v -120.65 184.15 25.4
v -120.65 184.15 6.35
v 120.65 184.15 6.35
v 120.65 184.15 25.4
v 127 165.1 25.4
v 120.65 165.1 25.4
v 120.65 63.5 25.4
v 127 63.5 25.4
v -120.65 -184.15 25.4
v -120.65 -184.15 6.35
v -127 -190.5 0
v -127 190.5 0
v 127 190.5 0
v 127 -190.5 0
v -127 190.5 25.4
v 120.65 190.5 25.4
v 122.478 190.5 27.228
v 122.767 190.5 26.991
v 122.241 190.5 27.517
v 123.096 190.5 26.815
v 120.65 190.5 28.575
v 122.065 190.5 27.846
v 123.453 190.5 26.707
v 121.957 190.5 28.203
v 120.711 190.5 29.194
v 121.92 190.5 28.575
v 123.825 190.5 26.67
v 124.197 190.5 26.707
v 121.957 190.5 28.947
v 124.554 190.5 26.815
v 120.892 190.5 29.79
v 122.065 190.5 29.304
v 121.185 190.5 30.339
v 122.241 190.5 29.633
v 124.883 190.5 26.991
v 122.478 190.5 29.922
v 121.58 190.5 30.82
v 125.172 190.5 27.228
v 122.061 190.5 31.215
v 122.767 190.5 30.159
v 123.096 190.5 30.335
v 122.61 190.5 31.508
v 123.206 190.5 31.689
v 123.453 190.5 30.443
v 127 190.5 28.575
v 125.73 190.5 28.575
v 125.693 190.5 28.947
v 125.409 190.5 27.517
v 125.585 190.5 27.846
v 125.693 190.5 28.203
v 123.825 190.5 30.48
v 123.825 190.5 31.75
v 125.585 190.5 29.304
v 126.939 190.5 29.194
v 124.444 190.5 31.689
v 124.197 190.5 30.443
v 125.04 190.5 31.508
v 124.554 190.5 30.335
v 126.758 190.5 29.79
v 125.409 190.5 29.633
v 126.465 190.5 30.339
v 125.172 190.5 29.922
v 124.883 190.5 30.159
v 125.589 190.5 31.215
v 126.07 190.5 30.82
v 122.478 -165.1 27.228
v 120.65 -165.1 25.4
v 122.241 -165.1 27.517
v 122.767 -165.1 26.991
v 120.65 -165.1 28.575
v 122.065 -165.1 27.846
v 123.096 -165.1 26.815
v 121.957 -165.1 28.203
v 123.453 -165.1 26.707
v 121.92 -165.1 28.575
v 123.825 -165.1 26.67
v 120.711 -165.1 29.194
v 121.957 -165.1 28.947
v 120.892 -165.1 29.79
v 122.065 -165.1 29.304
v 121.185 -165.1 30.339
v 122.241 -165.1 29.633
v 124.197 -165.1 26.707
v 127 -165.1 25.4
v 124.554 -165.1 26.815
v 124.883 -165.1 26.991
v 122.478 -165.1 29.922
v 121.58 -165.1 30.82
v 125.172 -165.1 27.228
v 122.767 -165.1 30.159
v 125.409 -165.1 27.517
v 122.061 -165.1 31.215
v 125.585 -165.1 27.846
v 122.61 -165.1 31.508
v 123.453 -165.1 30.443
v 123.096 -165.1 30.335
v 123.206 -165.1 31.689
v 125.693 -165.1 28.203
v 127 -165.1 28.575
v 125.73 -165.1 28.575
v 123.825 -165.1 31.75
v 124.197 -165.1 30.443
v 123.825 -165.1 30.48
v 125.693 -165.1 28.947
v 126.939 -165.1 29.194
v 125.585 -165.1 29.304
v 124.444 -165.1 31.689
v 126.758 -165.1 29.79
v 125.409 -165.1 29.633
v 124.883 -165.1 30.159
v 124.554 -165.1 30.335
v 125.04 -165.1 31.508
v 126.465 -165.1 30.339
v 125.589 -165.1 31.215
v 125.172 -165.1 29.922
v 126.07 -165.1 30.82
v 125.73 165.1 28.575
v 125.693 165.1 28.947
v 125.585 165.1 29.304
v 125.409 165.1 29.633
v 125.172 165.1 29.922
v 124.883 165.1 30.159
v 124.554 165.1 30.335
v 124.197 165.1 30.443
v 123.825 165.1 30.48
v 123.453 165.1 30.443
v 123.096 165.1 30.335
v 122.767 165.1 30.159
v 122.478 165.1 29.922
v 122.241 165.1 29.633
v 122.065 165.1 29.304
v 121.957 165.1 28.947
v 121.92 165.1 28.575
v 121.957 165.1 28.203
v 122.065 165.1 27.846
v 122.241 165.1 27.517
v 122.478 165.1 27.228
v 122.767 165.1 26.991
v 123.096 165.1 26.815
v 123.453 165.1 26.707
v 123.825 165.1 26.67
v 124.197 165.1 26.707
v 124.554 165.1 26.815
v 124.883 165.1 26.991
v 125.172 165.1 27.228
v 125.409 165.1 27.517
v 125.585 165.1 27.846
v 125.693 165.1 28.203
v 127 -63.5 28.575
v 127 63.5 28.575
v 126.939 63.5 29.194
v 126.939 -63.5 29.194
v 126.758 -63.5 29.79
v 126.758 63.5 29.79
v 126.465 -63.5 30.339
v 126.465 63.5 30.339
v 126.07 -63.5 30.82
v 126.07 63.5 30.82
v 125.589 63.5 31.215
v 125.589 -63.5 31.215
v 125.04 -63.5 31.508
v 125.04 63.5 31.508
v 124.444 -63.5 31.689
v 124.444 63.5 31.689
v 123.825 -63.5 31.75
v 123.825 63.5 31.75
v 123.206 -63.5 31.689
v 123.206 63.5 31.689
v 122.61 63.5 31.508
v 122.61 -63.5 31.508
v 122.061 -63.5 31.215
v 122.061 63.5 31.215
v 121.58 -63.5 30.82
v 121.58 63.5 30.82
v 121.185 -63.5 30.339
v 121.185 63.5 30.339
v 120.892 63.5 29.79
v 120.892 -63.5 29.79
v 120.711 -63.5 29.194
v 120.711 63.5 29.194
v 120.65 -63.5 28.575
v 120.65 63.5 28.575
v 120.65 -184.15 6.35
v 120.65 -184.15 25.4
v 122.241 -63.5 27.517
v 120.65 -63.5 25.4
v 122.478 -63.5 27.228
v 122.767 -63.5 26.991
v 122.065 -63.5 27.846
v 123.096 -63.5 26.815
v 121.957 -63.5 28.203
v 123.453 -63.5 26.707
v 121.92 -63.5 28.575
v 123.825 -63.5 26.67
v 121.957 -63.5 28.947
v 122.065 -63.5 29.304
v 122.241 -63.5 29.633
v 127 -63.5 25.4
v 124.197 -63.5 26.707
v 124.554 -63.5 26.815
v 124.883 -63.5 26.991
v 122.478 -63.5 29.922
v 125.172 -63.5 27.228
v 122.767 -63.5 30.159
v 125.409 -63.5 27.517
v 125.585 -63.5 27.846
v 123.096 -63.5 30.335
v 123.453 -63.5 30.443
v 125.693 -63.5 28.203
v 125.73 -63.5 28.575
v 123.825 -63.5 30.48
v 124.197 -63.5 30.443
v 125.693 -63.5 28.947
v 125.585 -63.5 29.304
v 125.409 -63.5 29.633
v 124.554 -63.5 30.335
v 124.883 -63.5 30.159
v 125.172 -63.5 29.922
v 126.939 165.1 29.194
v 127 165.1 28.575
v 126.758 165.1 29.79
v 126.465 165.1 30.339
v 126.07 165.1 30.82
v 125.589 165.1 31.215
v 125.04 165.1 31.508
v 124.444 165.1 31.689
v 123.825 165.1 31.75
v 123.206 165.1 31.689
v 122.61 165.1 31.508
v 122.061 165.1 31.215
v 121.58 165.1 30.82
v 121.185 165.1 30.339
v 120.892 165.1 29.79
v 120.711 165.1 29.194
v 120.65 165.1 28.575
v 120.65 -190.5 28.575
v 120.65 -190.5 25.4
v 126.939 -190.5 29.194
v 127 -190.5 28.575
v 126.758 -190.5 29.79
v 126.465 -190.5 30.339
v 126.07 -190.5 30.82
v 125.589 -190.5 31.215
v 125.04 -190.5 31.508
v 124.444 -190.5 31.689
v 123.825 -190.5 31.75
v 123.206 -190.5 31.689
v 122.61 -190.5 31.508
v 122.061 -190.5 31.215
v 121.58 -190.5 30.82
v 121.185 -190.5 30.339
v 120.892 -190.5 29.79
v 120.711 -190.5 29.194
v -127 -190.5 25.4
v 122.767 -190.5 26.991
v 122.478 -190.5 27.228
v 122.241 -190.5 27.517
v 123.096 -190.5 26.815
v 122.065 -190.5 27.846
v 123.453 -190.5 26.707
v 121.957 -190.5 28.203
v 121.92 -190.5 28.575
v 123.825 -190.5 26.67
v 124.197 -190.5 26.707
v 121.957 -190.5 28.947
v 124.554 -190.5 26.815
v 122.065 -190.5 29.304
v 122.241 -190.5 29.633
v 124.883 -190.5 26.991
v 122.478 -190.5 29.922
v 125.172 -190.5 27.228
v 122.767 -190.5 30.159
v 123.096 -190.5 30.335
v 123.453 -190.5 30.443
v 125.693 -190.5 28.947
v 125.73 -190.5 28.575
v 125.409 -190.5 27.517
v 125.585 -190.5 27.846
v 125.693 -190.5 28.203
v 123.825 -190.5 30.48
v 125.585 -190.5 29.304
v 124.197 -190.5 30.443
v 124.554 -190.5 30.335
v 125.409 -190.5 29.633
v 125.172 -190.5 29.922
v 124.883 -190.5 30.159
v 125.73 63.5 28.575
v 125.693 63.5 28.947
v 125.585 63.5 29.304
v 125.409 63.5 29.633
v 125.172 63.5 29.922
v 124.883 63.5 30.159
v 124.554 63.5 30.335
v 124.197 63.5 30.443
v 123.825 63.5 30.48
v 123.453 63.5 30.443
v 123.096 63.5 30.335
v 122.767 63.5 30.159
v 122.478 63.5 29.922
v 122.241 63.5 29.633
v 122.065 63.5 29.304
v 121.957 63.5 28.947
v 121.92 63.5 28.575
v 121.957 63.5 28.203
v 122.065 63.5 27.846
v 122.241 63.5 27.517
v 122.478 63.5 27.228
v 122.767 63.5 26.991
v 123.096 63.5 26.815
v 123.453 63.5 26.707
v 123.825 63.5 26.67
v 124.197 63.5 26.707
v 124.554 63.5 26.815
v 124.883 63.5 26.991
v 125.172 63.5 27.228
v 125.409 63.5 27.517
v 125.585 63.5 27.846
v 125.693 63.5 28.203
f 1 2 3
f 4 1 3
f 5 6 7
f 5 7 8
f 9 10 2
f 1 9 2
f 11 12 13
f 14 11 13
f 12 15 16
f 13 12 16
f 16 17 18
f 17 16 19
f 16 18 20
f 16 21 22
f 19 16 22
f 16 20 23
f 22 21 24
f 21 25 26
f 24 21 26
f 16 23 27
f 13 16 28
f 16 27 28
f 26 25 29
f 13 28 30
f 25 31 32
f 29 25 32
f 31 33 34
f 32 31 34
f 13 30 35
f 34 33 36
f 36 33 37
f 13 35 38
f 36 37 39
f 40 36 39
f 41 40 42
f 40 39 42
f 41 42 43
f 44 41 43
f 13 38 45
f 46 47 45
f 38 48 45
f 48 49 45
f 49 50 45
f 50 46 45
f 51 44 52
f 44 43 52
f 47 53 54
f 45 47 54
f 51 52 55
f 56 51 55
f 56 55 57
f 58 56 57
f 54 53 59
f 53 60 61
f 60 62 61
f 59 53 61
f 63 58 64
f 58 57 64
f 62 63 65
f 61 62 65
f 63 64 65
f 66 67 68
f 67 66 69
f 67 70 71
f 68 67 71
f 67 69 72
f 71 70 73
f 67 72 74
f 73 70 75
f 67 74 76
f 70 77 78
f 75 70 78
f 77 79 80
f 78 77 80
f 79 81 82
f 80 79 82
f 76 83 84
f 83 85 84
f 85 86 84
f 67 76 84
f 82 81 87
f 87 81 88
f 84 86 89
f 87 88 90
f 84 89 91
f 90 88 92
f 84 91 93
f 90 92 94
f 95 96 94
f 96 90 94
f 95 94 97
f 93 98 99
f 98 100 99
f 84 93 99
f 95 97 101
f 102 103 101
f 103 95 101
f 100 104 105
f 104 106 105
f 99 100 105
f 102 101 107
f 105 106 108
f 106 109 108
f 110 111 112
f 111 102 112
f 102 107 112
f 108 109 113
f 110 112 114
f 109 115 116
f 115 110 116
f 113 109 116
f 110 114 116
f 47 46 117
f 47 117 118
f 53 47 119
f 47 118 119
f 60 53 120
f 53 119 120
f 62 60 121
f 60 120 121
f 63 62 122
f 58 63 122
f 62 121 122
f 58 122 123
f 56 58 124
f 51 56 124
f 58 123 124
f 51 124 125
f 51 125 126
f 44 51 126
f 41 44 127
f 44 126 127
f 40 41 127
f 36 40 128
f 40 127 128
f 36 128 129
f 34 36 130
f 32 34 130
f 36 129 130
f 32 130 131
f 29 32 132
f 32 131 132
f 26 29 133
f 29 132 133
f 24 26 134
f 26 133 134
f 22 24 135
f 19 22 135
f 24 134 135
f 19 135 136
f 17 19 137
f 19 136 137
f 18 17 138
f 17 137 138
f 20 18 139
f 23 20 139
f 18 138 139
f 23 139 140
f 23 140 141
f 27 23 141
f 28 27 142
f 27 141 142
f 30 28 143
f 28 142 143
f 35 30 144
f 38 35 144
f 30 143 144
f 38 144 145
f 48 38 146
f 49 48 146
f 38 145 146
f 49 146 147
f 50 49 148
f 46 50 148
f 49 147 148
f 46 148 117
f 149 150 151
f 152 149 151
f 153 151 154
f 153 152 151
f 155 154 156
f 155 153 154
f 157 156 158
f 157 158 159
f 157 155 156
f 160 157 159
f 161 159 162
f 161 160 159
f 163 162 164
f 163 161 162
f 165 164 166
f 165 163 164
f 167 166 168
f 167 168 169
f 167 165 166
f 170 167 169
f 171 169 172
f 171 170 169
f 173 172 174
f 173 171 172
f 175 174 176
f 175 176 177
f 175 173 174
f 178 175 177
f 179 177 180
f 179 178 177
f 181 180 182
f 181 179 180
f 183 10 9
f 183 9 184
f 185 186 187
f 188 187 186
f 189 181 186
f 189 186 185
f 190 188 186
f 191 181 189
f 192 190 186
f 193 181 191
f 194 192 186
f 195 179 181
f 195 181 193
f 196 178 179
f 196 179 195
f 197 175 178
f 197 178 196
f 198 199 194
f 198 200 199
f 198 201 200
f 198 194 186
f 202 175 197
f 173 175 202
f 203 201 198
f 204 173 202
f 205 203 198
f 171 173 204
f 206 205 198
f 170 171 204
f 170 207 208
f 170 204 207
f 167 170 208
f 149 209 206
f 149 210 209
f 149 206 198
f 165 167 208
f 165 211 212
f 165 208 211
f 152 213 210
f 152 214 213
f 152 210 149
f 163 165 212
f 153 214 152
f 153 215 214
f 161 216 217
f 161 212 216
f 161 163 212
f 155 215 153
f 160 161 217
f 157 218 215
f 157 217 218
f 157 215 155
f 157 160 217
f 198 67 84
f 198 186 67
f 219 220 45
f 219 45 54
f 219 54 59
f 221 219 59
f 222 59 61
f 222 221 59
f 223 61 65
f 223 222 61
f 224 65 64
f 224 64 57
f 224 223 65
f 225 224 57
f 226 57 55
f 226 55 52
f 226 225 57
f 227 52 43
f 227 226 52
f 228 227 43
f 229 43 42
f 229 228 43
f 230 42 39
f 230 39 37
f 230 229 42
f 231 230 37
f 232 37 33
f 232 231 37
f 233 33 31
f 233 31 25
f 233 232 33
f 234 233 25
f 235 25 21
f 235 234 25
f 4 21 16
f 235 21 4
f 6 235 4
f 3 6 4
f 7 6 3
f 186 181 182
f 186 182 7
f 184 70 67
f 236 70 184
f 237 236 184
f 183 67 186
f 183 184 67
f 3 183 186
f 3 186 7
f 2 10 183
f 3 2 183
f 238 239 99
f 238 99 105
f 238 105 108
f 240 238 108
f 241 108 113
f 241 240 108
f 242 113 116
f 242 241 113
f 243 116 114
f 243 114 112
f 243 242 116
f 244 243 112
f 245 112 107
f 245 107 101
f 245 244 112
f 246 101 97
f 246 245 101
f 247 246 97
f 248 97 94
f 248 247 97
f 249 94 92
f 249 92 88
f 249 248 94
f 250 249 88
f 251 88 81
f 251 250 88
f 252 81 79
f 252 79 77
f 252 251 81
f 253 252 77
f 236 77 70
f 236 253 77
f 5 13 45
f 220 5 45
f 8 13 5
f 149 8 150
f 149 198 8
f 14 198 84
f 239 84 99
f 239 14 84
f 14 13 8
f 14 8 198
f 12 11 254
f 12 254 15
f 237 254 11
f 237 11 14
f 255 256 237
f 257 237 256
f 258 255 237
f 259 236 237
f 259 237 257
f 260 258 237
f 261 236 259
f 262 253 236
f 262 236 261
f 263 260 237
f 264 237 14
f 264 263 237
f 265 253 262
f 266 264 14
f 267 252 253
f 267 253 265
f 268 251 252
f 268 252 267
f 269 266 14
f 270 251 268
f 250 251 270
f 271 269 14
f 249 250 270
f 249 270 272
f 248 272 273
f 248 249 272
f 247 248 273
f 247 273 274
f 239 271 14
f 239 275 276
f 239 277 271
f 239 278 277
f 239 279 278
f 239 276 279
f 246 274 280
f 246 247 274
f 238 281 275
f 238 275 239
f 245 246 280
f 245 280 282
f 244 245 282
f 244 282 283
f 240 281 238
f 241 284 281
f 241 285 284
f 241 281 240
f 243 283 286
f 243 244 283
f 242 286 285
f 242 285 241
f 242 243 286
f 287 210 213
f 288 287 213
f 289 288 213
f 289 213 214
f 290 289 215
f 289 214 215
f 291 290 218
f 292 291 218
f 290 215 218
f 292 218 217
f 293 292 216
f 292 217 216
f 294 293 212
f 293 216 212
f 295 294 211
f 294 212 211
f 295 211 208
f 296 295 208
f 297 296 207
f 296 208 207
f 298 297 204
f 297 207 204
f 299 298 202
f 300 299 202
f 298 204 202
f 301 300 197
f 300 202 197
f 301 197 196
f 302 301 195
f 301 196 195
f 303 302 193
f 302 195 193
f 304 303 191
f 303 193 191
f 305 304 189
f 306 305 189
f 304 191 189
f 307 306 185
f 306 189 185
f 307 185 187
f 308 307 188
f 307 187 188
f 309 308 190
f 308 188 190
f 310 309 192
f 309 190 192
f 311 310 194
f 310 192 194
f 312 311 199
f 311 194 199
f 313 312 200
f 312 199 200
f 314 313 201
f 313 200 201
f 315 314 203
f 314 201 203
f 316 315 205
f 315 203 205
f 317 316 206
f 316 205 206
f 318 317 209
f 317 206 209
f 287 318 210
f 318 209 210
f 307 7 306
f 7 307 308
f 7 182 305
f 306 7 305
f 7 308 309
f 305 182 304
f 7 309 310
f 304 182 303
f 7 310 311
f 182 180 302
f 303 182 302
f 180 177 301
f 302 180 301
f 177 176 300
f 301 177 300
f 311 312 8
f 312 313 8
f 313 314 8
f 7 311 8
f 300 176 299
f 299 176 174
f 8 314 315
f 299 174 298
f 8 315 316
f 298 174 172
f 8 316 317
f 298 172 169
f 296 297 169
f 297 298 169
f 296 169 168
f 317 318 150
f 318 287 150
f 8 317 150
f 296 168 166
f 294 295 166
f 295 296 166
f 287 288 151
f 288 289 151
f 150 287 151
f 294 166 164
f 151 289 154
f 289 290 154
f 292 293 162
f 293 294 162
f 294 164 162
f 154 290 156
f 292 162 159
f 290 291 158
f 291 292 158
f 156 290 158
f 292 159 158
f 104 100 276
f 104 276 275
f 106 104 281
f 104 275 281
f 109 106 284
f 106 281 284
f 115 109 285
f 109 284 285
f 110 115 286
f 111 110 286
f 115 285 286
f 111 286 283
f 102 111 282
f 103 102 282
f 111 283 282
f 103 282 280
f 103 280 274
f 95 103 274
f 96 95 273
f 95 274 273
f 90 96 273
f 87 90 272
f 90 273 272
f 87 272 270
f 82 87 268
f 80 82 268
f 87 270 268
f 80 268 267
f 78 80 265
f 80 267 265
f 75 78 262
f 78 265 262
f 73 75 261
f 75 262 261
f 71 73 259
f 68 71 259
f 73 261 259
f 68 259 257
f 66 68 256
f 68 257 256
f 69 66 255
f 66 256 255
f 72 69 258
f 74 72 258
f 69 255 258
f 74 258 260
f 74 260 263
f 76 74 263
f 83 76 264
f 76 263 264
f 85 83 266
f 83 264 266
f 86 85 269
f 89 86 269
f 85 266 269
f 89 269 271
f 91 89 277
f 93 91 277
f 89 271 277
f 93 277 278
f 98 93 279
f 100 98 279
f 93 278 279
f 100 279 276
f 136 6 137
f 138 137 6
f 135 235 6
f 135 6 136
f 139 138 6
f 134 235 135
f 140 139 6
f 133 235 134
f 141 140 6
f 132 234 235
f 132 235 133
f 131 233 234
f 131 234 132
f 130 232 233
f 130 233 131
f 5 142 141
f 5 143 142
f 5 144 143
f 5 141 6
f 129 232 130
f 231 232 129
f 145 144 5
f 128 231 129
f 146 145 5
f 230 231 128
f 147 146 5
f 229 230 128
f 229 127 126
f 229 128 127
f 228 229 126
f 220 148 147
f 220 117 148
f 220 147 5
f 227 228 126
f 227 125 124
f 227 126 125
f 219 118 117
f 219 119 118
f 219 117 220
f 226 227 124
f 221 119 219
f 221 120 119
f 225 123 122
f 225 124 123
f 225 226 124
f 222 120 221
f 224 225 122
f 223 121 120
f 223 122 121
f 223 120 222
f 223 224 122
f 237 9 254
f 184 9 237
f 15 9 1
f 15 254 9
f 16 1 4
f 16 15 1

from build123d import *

# Parameters (mm, degrees)
F0_W     = 254
F0_H     = 381
F0_W_2   = 241.3
F0_H_2   = 368.3
F1_DEPTH = 25.4
F2_DEPTH = 6.35
F4_START = -127
F3_R     = 1.905
F4_DEPTH = 127
F5_DEPTH = 25.4
F6_START = -355.6
F6_DEPTH = 25.4


with BuildPart() as f1:
    # F0 (on Top) → F1 (new body)
    with BuildSketch(Plane.XY):
        Rectangle(F0_W, F0_H)
        Rectangle(F0_W_2, F0_H_2, mode=Mode.SUBTRACT)
    extrude(amount=F1_DEPTH)

    # F0 (on Top) → F2 (join)
    with BuildSketch(Plane.XY):
        Rectangle(F0_W_2, F0_H_2)
    extrude(amount=F2_DEPTH)

    # F3 (on face) → F4 (join)
    with BuildSketch(Plane.XZ.offset(190.5).offset(F4_START)):
        with BuildLine():
            Line((120.65, 25.4), (127, 25.4))
            Line((127, 25.4), (127, 28.575))
            ThreePointArc((127, 28.575), (123.825, 31.75), (120.65, 28.575))
            Line((120.65, 28.575), (120.65, 25.4))
        make_face()
        with Locations((123.825, 28.575)):
            Circle(F3_R, mode=Mode.SUBTRACT)
    extrude(amount=-F4_DEPTH)

    # F3 (on face) → F5 (join)
    with BuildSketch(Plane.XZ.offset(190.5)):
        with BuildLine():
            Line((120.65, 25.4), (127, 25.4))
            Line((127, 25.4), (127, 28.575))
            ThreePointArc((127, 28.575), (123.825, 31.75), (120.65, 28.575))
            Line((120.65, 28.575), (120.65, 25.4))
        make_face()
        with Locations((123.825, 28.575)):
            Circle(F3_R, mode=Mode.SUBTRACT)
    extrude(amount=-F5_DEPTH)

    # F3 (on face) → F6 (join)
    with BuildSketch(Plane.XZ.offset(190.5).offset(F6_START)):
        with BuildLine():
            Line((120.65, 25.4), (127, 25.4))
            Line((127, 25.4), (127, 28.575))
            ThreePointArc((127, 28.575), (123.825, 31.75), (120.65, 28.575))
            Line((120.65, 28.575), (120.65, 25.4))
        make_face()
        with Locations((123.825, 28.575)):
            Circle(F3_R, mode=Mode.SUBTRACT)
    extrude(amount=-F6_DEPTH)


solid = f1.part
